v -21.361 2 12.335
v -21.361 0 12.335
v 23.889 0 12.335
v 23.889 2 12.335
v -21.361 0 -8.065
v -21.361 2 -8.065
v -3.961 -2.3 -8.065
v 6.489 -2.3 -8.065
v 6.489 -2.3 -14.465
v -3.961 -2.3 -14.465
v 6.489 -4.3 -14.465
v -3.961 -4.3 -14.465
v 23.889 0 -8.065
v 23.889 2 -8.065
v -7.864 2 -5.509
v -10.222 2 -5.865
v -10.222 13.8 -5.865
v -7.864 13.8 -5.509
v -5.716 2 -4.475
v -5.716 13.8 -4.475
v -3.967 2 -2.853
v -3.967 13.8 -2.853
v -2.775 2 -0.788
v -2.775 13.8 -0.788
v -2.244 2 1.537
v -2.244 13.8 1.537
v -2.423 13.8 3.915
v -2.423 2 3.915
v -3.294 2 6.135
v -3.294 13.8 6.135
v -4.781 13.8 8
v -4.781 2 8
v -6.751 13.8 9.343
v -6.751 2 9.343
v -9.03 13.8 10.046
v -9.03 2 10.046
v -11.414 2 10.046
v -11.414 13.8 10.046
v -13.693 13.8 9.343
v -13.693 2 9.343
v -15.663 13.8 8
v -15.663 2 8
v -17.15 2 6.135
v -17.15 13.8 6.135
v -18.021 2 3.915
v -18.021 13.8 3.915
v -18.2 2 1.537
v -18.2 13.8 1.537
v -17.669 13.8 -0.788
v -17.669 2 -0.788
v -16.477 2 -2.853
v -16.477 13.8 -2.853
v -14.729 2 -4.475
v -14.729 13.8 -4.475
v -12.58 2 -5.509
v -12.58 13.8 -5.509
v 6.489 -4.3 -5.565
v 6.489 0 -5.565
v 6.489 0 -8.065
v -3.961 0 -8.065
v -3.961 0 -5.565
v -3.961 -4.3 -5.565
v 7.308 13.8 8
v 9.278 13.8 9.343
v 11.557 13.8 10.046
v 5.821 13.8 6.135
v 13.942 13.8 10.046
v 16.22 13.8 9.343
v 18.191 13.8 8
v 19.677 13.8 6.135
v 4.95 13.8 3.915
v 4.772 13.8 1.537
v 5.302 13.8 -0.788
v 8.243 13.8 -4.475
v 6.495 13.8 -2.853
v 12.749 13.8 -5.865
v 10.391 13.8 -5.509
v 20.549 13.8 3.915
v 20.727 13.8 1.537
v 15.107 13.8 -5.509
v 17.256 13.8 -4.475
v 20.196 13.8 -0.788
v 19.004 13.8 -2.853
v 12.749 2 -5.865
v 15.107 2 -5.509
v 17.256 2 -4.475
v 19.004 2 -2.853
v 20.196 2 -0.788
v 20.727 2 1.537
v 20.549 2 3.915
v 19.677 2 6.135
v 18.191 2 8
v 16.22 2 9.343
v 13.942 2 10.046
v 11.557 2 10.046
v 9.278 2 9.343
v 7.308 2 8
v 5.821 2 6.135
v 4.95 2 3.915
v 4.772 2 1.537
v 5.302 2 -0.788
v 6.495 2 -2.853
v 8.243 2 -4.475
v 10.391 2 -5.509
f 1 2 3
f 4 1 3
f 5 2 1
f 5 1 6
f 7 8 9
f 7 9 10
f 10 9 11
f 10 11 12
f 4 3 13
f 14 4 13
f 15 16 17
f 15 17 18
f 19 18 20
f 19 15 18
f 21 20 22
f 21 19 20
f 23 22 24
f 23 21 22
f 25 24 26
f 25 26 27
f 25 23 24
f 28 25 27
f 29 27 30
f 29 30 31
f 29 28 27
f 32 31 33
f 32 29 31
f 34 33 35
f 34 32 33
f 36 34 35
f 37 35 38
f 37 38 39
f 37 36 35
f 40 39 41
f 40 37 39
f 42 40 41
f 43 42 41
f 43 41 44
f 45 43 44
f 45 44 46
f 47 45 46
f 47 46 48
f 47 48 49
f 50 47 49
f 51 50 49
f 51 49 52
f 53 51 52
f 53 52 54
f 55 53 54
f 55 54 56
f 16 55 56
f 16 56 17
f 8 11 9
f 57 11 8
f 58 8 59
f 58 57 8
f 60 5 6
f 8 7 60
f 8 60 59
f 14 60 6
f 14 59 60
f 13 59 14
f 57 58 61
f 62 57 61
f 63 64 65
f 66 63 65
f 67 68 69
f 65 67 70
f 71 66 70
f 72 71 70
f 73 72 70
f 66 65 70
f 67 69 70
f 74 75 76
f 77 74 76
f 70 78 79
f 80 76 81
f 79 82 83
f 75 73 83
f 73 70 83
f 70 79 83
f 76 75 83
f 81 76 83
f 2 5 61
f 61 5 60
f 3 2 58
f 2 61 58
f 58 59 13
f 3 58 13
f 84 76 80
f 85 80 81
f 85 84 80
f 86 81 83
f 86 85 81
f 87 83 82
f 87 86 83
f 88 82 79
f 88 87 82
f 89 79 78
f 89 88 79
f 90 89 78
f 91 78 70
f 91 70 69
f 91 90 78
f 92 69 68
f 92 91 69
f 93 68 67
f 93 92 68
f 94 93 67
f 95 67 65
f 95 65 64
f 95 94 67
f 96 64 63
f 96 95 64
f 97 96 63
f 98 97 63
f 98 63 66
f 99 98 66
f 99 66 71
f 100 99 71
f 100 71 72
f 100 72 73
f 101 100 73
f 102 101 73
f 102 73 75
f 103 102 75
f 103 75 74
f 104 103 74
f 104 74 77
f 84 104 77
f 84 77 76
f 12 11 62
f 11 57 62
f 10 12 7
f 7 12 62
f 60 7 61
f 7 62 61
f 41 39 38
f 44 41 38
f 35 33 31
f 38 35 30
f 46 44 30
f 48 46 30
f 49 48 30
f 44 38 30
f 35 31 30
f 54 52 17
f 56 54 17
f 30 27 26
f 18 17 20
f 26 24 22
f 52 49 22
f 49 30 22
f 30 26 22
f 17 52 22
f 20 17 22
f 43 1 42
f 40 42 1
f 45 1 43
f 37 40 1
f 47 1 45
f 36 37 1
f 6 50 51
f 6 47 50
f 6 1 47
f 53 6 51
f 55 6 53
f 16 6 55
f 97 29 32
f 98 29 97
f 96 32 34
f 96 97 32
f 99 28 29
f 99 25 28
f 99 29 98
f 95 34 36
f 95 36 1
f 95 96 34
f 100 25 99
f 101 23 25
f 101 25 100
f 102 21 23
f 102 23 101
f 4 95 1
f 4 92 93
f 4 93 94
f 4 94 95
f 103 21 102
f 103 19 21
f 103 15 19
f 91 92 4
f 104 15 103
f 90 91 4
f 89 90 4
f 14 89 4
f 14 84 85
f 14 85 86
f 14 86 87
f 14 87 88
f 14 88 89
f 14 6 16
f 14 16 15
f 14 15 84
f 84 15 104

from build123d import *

# Parameters (mm, degrees)
CROQUIS1_W              = 45.25
CROQUIS1_H              = 20.4
CROQUIS1_R              = 8
SALIENTE_EXTRUIR1_DEPTH = 2
CROQUIS2_R              = 8
SALIENTE_EXTRUIR2_DEPTH = 13.8
CROQUIS3_W              = 10.45
CROQUIS3_H              = 2.5
SALIENTE_EXTRUIR4_DEPTH = 4.3
CROQUIS4_W              = 10.45
CROQUIS4_H              = 2
SALIENTE_EXTRUIR5_DEPTH = 6.4


with BuildPart() as part:
    # Croquis1 → Saliente-Extruir1 (new body)
    with BuildSketch(Plane(origin=(0, 0, 0), x_dir=(1, 0, 0), z_dir=(0, 1, 0))):
        with Locations((1.264210019, -2.135211946)):
            Rectangle(CROQUIS1_W, CROQUIS1_H)
        with Locations(Location((-10.222061657, -2.135211946, 0), (0, 0, 270))):
            Circle(CROQUIS1_R, mode=Mode.SUBTRACT)
        with Locations(Location((12.749210019, -2.135211946, 0), (0, 0, 270))):
            Circle(CROQUIS1_R, mode=Mode.SUBTRACT)
    extrude(amount=SALIENTE_EXTRUIR1_DEPTH)

    # Croquis2 → Saliente-Extruir2 (add)
    with BuildSketch(Plane(origin=(0, 0, 0), x_dir=(-1, 0, 0), z_dir=(0, -1, 0))):
        with Locations(Location((10.222061657, -2.135211946, 0), (0, 0, 90))):
            Circle(CROQUIS2_R)
        with Locations(Location((-12.749210019, -2.135211946, 0), (0, 0, 90))):
            Circle(CROQUIS2_R)
    extrude(amount=-SALIENTE_EXTRUIR2_DEPTH)

    # Croquis3 → Saliente-Extruir4 (add)
    with BuildSketch(Plane(origin=(0, 0, 0), x_dir=(-1, 0, 0), z_dir=(0, -1, 0))):
        with Locations((-1.264210019, 6.814788054)):
            Rectangle(CROQUIS3_W, CROQUIS3_H)
    extrude(amount=SALIENTE_EXTRUIR4_DEPTH)

    # Croquis4 → Saliente-Extruir5 (add)
    with BuildSketch(Plane(origin=(0, 0, -8.064788054), x_dir=(-1, 0, 0), z_dir=(0, 0, -1))):
        with Locations((-1.264210019, -3.3)):
            Rectangle(CROQUIS4_W, CROQUIS4_H)
    extrude(amount=SALIENTE_EXTRUIR5_DEPTH)


solid = part.part
